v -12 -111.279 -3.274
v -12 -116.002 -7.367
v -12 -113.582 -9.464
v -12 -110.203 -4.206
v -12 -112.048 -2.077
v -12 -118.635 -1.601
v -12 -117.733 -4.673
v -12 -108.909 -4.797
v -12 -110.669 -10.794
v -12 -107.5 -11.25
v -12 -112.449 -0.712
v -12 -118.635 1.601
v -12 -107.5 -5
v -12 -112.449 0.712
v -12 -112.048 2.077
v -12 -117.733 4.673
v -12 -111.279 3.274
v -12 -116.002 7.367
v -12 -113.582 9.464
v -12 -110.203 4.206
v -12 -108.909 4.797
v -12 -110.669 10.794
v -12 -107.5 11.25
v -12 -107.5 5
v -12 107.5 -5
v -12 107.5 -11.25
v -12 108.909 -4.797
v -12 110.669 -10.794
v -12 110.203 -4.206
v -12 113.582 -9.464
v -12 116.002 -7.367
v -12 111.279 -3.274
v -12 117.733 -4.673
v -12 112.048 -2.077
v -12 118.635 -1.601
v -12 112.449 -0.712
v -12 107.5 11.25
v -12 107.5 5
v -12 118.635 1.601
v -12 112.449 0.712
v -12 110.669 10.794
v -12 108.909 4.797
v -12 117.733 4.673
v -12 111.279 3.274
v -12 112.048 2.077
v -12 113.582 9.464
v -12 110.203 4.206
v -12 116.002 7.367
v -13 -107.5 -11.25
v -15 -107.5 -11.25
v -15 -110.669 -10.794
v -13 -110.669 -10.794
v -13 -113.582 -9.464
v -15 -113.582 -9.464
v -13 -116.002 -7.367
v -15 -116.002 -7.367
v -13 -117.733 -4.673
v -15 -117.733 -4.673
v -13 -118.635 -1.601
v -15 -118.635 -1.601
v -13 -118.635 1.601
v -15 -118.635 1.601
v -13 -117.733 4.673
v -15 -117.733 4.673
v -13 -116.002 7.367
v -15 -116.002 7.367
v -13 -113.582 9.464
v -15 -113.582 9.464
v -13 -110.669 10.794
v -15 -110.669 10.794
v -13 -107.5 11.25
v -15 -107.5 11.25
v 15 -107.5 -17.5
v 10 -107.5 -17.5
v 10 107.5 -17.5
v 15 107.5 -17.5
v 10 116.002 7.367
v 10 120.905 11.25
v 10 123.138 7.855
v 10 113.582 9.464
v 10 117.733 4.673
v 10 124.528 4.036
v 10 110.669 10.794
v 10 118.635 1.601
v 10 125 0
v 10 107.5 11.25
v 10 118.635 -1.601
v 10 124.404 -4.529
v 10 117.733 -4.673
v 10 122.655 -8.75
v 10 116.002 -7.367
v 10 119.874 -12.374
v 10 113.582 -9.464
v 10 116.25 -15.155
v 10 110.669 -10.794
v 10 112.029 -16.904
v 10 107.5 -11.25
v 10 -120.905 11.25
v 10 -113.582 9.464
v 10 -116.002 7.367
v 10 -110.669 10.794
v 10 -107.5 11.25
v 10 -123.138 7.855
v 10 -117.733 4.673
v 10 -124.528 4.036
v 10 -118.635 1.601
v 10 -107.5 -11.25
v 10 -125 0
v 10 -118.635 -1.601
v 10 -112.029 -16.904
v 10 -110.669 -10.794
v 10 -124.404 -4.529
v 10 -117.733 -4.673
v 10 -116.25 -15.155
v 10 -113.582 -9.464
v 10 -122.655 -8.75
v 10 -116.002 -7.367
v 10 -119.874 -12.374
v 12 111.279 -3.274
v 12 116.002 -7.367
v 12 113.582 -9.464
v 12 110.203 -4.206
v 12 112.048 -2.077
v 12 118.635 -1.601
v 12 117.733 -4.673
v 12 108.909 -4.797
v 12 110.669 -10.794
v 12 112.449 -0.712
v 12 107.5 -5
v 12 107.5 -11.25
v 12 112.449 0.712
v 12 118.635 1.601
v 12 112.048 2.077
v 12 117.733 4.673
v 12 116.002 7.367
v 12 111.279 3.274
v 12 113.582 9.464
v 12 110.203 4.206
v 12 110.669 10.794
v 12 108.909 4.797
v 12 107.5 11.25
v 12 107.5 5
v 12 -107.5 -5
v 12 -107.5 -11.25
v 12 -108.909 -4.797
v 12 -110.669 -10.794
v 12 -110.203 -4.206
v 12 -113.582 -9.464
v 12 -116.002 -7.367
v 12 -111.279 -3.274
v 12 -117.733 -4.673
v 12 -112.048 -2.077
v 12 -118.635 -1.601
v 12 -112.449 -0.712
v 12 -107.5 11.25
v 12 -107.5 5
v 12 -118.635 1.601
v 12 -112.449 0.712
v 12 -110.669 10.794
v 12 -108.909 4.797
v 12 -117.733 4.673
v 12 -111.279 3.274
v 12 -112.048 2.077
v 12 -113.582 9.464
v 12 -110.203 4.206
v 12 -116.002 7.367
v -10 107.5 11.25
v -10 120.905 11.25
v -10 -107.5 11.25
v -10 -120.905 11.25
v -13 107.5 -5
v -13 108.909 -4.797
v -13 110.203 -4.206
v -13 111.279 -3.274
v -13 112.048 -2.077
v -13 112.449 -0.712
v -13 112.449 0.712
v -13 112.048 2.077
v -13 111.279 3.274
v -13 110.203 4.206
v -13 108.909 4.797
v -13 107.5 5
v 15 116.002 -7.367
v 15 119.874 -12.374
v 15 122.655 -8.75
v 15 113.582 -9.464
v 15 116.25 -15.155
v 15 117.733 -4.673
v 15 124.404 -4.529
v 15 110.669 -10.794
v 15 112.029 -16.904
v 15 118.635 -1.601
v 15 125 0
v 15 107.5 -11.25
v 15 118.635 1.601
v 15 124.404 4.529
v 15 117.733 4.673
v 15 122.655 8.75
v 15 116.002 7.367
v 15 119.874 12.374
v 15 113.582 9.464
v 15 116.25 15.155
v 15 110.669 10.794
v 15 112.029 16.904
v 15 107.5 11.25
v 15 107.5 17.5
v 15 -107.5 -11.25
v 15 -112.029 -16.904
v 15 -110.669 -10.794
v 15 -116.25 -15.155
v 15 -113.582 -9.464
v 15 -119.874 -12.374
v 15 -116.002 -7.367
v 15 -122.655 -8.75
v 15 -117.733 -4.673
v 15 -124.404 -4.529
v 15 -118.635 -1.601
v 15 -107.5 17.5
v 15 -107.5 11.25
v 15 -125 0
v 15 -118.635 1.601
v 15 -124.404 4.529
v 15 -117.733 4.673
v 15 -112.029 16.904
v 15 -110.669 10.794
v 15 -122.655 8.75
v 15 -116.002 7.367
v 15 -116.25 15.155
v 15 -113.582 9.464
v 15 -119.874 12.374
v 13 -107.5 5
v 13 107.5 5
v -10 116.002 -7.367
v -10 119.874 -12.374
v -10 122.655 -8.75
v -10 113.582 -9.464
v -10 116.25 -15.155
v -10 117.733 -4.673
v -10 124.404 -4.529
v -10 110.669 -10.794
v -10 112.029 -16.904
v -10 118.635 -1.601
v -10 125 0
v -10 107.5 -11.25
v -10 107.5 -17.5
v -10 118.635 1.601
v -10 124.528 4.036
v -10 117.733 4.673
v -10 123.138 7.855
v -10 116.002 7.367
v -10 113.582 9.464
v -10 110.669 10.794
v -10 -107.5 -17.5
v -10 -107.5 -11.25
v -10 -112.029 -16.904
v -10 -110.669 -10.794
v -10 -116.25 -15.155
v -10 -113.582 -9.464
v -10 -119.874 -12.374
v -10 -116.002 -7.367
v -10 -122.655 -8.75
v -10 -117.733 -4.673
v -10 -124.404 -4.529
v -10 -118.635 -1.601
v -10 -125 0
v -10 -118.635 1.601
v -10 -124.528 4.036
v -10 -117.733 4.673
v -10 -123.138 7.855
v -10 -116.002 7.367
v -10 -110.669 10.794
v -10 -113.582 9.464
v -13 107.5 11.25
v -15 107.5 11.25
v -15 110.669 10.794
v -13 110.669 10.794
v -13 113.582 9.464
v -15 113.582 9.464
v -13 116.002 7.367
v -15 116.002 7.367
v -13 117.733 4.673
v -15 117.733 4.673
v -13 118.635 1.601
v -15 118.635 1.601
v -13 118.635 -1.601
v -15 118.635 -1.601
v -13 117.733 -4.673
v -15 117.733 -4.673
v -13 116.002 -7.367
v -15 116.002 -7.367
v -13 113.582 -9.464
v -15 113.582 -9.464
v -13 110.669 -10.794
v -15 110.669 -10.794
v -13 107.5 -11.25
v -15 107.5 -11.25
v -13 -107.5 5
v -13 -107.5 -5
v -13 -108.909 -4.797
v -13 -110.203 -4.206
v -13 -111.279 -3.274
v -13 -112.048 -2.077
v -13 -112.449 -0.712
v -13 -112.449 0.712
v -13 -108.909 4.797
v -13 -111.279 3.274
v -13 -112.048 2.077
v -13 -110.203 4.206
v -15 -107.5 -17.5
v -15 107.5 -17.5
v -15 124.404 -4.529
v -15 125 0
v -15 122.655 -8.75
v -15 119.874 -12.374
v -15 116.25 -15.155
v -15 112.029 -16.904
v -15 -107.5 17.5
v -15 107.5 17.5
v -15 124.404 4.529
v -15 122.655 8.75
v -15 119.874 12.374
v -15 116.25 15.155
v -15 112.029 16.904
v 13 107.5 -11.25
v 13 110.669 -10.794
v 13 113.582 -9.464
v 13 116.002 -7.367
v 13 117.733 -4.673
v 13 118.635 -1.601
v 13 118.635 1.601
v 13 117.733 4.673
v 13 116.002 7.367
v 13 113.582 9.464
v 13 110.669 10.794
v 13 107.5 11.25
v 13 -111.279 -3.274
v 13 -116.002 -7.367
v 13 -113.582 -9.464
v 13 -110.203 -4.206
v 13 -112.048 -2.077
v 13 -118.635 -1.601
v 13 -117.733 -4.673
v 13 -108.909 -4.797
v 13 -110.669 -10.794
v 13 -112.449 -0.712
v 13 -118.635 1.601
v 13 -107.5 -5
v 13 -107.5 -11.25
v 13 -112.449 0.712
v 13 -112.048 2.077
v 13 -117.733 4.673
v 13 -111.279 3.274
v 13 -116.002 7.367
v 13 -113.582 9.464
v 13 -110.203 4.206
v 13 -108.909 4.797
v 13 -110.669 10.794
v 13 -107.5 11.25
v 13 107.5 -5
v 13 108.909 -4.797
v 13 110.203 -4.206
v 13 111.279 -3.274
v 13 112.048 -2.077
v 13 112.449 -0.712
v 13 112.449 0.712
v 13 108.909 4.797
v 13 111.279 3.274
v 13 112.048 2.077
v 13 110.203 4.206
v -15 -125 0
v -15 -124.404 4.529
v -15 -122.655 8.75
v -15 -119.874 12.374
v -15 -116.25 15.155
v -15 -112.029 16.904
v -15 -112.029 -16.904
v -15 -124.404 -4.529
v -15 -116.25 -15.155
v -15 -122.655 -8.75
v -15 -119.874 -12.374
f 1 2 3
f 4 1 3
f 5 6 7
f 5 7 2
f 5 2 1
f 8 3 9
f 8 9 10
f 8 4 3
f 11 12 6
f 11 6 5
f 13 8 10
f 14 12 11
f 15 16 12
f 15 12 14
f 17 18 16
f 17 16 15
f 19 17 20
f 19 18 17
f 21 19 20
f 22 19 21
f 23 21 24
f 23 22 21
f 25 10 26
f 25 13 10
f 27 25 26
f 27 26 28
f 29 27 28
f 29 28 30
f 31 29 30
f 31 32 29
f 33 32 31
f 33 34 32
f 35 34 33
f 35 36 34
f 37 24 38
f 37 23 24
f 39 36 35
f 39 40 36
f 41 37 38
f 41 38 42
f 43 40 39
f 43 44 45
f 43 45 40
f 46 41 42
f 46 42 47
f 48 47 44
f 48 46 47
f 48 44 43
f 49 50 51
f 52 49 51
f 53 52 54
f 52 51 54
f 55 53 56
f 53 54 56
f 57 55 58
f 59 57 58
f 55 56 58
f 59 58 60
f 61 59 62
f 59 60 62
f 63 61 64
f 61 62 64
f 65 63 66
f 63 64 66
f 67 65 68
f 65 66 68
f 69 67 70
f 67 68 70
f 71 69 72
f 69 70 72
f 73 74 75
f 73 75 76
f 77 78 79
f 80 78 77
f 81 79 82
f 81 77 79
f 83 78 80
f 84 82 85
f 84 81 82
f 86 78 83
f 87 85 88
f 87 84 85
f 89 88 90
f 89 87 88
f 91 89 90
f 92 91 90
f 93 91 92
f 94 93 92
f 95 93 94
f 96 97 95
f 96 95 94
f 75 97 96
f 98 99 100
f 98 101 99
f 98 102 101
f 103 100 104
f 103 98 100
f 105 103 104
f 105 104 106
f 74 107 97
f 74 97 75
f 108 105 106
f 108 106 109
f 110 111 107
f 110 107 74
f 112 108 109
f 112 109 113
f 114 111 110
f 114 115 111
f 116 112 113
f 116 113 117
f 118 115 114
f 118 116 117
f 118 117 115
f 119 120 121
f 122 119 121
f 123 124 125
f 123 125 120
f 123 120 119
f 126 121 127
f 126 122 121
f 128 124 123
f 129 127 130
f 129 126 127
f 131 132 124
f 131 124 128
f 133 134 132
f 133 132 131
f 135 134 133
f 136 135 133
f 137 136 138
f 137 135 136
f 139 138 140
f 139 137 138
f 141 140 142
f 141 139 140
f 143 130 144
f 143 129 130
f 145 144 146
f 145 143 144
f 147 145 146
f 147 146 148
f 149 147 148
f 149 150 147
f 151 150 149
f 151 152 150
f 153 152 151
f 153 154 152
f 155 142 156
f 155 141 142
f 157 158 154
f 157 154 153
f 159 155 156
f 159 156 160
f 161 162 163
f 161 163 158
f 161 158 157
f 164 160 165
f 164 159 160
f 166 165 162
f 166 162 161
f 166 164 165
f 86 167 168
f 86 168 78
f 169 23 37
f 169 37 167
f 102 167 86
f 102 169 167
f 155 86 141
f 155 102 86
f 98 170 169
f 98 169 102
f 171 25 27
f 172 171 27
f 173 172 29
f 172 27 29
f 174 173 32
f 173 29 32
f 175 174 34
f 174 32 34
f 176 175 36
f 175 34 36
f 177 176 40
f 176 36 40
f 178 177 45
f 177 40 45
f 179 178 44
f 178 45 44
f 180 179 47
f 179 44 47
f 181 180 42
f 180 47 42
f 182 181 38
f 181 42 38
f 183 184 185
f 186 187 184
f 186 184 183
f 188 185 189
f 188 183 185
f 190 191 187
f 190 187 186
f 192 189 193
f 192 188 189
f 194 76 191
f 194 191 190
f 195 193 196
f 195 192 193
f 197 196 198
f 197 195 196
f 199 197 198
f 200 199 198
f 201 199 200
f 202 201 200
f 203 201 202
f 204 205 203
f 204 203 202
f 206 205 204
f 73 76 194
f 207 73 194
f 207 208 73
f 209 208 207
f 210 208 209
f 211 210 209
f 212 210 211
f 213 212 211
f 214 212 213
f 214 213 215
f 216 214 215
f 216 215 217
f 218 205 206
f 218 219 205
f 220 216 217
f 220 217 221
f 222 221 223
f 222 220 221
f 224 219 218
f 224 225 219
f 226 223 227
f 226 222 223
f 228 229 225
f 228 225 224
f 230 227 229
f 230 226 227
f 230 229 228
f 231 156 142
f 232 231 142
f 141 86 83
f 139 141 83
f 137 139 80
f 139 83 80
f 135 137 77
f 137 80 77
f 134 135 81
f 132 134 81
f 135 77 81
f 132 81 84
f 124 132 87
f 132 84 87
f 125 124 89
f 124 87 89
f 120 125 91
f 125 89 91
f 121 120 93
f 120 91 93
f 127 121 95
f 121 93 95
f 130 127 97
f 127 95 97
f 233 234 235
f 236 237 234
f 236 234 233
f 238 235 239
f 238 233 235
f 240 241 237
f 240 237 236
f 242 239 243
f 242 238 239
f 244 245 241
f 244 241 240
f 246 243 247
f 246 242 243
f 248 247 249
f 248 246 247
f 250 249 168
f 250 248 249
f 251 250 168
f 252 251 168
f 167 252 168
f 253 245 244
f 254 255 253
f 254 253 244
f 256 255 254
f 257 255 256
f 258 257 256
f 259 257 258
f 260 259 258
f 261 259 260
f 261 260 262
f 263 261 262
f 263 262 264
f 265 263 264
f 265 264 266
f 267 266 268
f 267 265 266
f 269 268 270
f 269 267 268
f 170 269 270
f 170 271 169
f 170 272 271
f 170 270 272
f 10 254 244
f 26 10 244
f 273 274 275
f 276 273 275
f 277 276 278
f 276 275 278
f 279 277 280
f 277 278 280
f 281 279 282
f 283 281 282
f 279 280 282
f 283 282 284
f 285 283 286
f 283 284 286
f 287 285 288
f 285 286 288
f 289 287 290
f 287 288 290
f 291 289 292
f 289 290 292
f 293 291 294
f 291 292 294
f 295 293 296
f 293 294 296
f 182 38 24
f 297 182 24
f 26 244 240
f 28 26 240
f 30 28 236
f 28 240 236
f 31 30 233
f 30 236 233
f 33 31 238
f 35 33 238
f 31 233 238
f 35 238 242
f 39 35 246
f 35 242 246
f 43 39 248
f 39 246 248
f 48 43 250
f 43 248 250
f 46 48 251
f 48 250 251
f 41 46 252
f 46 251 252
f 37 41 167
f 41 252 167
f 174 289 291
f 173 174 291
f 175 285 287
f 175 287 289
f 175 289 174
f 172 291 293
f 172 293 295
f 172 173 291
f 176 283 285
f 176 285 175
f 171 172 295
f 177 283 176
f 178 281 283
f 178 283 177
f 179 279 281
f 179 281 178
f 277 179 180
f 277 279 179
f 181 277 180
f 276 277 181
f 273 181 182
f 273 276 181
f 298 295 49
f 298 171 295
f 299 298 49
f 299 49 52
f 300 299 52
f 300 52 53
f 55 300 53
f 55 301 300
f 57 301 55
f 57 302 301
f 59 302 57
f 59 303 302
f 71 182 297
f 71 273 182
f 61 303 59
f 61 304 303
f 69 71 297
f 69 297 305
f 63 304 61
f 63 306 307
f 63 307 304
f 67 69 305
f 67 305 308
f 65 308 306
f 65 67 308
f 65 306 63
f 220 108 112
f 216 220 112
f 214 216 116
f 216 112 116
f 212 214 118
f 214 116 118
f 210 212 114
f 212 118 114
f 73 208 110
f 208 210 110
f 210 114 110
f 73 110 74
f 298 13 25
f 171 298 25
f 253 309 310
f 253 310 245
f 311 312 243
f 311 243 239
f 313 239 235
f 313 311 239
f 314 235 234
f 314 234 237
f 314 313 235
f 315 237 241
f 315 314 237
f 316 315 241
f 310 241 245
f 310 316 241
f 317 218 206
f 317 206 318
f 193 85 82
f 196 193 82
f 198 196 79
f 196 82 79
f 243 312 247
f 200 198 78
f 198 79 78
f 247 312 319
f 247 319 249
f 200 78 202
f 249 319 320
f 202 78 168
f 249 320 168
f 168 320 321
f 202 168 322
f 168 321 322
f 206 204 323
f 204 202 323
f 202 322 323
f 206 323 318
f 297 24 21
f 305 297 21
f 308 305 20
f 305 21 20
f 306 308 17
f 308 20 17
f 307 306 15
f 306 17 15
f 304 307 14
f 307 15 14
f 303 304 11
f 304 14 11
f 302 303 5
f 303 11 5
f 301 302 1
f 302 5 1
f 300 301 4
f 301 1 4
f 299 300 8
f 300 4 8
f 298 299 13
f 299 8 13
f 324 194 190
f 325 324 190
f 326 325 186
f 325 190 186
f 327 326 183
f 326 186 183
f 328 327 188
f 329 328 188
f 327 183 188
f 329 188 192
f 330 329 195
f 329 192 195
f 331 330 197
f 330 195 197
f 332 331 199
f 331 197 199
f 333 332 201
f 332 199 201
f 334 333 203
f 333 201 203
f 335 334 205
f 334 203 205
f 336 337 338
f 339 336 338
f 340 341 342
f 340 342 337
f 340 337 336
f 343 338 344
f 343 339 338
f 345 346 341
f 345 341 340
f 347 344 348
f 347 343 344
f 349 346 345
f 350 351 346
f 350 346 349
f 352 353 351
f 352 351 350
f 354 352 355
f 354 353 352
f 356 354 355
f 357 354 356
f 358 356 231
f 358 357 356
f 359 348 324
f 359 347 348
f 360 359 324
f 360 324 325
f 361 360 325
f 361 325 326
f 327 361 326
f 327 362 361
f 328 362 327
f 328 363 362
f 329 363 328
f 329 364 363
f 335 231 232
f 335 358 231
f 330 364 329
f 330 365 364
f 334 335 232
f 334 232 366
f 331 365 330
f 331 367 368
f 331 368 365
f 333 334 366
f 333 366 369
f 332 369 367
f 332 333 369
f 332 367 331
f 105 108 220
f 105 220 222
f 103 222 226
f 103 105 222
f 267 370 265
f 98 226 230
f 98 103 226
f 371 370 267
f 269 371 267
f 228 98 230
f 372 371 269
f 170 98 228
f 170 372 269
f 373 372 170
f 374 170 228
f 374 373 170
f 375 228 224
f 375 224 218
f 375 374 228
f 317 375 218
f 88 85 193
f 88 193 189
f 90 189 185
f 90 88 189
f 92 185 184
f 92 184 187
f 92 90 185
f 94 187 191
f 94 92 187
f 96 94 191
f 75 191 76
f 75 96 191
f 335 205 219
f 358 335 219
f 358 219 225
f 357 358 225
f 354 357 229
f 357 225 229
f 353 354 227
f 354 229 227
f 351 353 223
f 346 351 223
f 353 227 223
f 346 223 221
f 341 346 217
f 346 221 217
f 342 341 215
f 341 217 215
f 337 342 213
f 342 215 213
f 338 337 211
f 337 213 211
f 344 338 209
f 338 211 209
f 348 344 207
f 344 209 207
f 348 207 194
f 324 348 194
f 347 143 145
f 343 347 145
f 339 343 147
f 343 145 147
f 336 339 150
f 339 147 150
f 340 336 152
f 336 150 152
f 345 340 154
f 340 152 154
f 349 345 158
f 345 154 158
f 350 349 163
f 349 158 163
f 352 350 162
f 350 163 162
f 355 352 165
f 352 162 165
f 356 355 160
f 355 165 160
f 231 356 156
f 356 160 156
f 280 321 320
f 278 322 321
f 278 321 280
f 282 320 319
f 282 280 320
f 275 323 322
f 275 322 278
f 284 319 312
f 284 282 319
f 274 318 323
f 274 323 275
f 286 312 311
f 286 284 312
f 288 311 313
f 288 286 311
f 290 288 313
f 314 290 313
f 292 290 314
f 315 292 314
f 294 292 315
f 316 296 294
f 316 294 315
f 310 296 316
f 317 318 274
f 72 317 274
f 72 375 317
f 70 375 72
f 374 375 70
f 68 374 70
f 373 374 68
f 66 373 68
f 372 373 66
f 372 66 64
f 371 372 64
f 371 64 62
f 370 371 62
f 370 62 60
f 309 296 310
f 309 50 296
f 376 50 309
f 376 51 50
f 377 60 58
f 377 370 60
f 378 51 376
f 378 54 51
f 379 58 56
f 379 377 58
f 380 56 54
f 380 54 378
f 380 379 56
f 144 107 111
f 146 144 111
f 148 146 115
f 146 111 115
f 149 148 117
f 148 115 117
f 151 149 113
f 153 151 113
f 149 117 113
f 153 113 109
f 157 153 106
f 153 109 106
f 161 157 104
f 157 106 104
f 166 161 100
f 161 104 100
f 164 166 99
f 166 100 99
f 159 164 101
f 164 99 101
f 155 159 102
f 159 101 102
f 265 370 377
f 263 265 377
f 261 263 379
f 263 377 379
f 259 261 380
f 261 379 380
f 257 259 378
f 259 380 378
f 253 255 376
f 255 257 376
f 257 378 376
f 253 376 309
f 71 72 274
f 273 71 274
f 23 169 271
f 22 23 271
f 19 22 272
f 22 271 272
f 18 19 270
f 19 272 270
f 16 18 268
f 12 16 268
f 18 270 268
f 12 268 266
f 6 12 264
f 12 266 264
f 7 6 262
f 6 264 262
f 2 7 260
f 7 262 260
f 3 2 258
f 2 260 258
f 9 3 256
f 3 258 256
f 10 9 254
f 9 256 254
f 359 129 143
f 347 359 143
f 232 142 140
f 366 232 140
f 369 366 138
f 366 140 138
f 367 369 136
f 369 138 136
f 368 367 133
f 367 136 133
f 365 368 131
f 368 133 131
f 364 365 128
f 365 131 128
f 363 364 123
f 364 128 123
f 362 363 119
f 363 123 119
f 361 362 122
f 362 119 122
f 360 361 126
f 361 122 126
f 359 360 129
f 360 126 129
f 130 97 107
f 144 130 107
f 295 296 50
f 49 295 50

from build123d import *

# Parameters (mm, degrees)
F1_DEPTH      = 125
F1_DEPTH_BACK = 125
F6_DEPTH      = 5.001
F7_DEPTH      = 5.001
F8_DEPTH      = 2
F9_DEPTH      = 2
F10_DEPTH     = 2
F11_DEPTH     = 2
F12_T1_DEPTH  = 92.5
F12_T3_DEPTH  = 92.5
F12_T5_DEPTH  = 117.5


# Not quite as in the source:
# - a fillet or chamfer that OpenCascade refuses, or shapes differently, is made with other operations: its cross-section is extruded or revolved along the edge and cut away or added


with BuildPart() as f1:
    # F0 (on Front) → F1 (new body, two sides)
    with BuildSketch(Plane.XZ) as f1_sk:
        Polygon((15, -17.5), (15, 17.5), (-15, 17.5), (-15, -17.5), (-10, -17.5), (-10, 11.25), (10, 11.25), (10, -17.5), align=None)
    extrude(amount=F1_DEPTH)
    extrude(f1_sk.sketch, amount=-F1_DEPTH_BACK)

    # F2 (on face) → F6 (cut, through all)
    with BuildSketch(Plane(origin=(10, 0, 0), x_dir=(0, -1, 0), z_dir=(-1, 0, 0))):
        with BuildLine():
            Line((-107.5, -5), (107.5, -5))
            ThreePointArc((107.5, -5), (112.5, 0), (107.5, 5))
            Line((107.5, 5), (-107.5, 5))
            ThreePointArc((-107.5, 5), (-112.5, 0), (-107.5, -5))
        make_face()
    extrude(amount=-F6_DEPTH, mode=Mode.SUBTRACT)

    # F4 (on face) → F7 (cut, through all)
    with BuildSketch(Plane.YZ.offset(-10)):
        with BuildLine():
            Line((107.5, 5), (-107.5, 5))
            ThreePointArc((-107.5, 5), (-112.5, 0), (-107.5, -5))
            Line((-107.5, -5), (107.5, -5))
            ThreePointArc((107.5, -5), (112.5, 0), (107.5, 5))
        make_face()
    extrude(amount=-F7_DEPTH, mode=Mode.SUBTRACT)

    # F2 (on face) → F8 (cut)
    with BuildSketch(Plane(origin=(10, 0, 0), x_dir=(0, -1, 0), z_dir=(-1, 0, 0))):
        with BuildLine():
            Line((-107.5, -11.25), (107.5, -11.25))
            ThreePointArc((107.5, -11.25), (118.75, 0), (107.5, 11.25))
            Line((107.5, 11.25), (-107.5, 11.25))
            ThreePointArc((-107.5, 11.25), (-118.75, 0), (-107.5, -11.25))
        make_face()
        with BuildLine():
            ThreePointArc((107.5, 5), (112.5, 0), (107.5, -5))
            Line((107.5, -5), (-107.5, -5))
            ThreePointArc((-107.5, -5), (-112.5, 0), (-107.5, 5))
            Line((-107.5, 5), (107.5, 5))
        make_face(mode=Mode.SUBTRACT)
    extrude(amount=-F8_DEPTH, mode=Mode.SUBTRACT)

    # F3 (on face) → F9 (cut)
    with BuildSketch(Plane.YZ.offset(15)):
        with BuildLine():
            ThreePointArc((-107.5, 11.25), (-118.75, 0), (-107.5, -11.25))
            Line((-107.5, -11.25), (107.5, -11.25))
            ThreePointArc((107.5, -11.25), (118.75, 0), (107.5, 11.25))
            Line((107.5, 11.25), (-107.5, 11.25))
        make_face()
        with BuildLine():
            ThreePointArc((-107.5, -5), (-112.5, 0), (-107.5, 5))
            Line((-107.5, 5), (107.5, 5))
            ThreePointArc((107.5, 5), (112.5, 0), (107.5, -5))
            Line((107.5, -5), (-107.5, -5))
        make_face(mode=Mode.SUBTRACT)
    extrude(amount=-F9_DEPTH, mode=Mode.SUBTRACT)

    # F5 (on face) → F10 (cut)
    with BuildSketch(Plane(origin=(-15, 0, 0), x_dir=(0, -1, 0), z_dir=(-1, 0, 0))):
        with BuildLine():
            Line((107.5, 11.25), (-107.5, 11.25))
            ThreePointArc((-107.5, 11.25), (-118.75, 0), (-107.5, -11.25))
            Line((-107.5, -11.25), (107.5, -11.25))
            ThreePointArc((107.5, -11.25), (118.75, 0), (107.5, 11.25))
        make_face()
        with BuildLine():
            ThreePointArc((-107.5, -5), (-112.5, 0), (-107.5, 5))
            Line((-107.5, 5), (107.5, 5))
            ThreePointArc((107.5, 5), (112.5, 0), (107.5, -5))
            Line((107.5, -5), (-107.5, -5))
        make_face(mode=Mode.SUBTRACT)
    extrude(amount=-F10_DEPTH, mode=Mode.SUBTRACT)

    # F4 (on face) → F11 (cut)
    with BuildSketch(Plane.YZ.offset(-10)):
        with BuildLine():
            Line((107.5, 11.25), (-107.5, 11.25))
            ThreePointArc((-107.5, 11.25), (-118.75, 0), (-107.5, -11.25))
            Line((-107.5, -11.25), (107.5, -11.25))
            ThreePointArc((107.5, -11.25), (118.75, 0), (107.5, 11.25))
        make_face()
        with BuildLine():
            ThreePointArc((-107.5, -5), (-112.5, 0), (-107.5, 5))
            Line((-107.5, 5), (107.5, 5))
            ThreePointArc((107.5, 5), (112.5, 0), (107.5, -5))
            Line((107.5, -5), (-107.5, -5))
        make_face(mode=Mode.SUBTRACT)
    extrude(amount=-F11_DEPTH, mode=Mode.SUBTRACT)

    # F12: fillet of radius 17.5 on 6 edges, made by hand

    # F12_s2 → F12_t1 (cut)
    with BuildSketch(Plane.YZ.offset(-58.75)):
        with BuildLine():
            ThreePointArc((125, 0), (119.8743686708, -12.3743686708), (107.5, -17.5))
            Line((107.5, -17.5), (125, -17.5))
            Line((125, -17.5), (125, 0))
        make_face()
        with BuildLine():
            ThreePointArc((-125, 0), (-119.8743686708, -12.3743686708), (-107.5, -17.5))
            Line((-107.5, -17.5), (-125, -17.5))
            Line((-125, -17.5), (-125, 0))
        make_face()
    extrude(amount=F12_T1_DEPTH, mode=Mode.SUBTRACT)

    # F12_s4 → F12_t3 (cut)
    with BuildSketch(Plane.YZ.offset(-33.75)):
        with BuildLine():
            ThreePointArc((107.5, -17.5), (119.8743686708, -12.3743686708), (125, 0))
            Line((125, 0), (125, -17.5))
            Line((125, -17.5), (107.5, -17.5))
        make_face()
        with BuildLine():
            ThreePointArc((-107.5, -17.5), (-119.8743686708, -12.3743686708), (-125, 0))
            Line((-125, 0), (-125, -17.5))
            Line((-125, -17.5), (-107.5, -17.5))
        make_face()
    extrude(amount=F12_T3_DEPTH, mode=Mode.SUBTRACT)

    # F12_s6 → F12_t5 (cut)
    with BuildSketch(Plane.YZ.offset(-58.75)):
        with BuildLine():
            ThreePointArc((125, 0), (119.8743686708, 12.3743686708), (107.5, 17.5))
            Line((107.5, 17.5), (125, 17.5))
            Line((125, 17.5), (125, 0))
        make_face()
        with BuildLine():
            ThreePointArc((-125, 0), (-119.8743686708, 12.3743686708), (-107.5, 17.5))
            Line((-107.5, 17.5), (-125, 17.5))
            Line((-125, 17.5), (-125, 0))
        make_face()
    extrude(amount=F12_T5_DEPTH, mode=Mode.SUBTRACT)


solid = f1.part
